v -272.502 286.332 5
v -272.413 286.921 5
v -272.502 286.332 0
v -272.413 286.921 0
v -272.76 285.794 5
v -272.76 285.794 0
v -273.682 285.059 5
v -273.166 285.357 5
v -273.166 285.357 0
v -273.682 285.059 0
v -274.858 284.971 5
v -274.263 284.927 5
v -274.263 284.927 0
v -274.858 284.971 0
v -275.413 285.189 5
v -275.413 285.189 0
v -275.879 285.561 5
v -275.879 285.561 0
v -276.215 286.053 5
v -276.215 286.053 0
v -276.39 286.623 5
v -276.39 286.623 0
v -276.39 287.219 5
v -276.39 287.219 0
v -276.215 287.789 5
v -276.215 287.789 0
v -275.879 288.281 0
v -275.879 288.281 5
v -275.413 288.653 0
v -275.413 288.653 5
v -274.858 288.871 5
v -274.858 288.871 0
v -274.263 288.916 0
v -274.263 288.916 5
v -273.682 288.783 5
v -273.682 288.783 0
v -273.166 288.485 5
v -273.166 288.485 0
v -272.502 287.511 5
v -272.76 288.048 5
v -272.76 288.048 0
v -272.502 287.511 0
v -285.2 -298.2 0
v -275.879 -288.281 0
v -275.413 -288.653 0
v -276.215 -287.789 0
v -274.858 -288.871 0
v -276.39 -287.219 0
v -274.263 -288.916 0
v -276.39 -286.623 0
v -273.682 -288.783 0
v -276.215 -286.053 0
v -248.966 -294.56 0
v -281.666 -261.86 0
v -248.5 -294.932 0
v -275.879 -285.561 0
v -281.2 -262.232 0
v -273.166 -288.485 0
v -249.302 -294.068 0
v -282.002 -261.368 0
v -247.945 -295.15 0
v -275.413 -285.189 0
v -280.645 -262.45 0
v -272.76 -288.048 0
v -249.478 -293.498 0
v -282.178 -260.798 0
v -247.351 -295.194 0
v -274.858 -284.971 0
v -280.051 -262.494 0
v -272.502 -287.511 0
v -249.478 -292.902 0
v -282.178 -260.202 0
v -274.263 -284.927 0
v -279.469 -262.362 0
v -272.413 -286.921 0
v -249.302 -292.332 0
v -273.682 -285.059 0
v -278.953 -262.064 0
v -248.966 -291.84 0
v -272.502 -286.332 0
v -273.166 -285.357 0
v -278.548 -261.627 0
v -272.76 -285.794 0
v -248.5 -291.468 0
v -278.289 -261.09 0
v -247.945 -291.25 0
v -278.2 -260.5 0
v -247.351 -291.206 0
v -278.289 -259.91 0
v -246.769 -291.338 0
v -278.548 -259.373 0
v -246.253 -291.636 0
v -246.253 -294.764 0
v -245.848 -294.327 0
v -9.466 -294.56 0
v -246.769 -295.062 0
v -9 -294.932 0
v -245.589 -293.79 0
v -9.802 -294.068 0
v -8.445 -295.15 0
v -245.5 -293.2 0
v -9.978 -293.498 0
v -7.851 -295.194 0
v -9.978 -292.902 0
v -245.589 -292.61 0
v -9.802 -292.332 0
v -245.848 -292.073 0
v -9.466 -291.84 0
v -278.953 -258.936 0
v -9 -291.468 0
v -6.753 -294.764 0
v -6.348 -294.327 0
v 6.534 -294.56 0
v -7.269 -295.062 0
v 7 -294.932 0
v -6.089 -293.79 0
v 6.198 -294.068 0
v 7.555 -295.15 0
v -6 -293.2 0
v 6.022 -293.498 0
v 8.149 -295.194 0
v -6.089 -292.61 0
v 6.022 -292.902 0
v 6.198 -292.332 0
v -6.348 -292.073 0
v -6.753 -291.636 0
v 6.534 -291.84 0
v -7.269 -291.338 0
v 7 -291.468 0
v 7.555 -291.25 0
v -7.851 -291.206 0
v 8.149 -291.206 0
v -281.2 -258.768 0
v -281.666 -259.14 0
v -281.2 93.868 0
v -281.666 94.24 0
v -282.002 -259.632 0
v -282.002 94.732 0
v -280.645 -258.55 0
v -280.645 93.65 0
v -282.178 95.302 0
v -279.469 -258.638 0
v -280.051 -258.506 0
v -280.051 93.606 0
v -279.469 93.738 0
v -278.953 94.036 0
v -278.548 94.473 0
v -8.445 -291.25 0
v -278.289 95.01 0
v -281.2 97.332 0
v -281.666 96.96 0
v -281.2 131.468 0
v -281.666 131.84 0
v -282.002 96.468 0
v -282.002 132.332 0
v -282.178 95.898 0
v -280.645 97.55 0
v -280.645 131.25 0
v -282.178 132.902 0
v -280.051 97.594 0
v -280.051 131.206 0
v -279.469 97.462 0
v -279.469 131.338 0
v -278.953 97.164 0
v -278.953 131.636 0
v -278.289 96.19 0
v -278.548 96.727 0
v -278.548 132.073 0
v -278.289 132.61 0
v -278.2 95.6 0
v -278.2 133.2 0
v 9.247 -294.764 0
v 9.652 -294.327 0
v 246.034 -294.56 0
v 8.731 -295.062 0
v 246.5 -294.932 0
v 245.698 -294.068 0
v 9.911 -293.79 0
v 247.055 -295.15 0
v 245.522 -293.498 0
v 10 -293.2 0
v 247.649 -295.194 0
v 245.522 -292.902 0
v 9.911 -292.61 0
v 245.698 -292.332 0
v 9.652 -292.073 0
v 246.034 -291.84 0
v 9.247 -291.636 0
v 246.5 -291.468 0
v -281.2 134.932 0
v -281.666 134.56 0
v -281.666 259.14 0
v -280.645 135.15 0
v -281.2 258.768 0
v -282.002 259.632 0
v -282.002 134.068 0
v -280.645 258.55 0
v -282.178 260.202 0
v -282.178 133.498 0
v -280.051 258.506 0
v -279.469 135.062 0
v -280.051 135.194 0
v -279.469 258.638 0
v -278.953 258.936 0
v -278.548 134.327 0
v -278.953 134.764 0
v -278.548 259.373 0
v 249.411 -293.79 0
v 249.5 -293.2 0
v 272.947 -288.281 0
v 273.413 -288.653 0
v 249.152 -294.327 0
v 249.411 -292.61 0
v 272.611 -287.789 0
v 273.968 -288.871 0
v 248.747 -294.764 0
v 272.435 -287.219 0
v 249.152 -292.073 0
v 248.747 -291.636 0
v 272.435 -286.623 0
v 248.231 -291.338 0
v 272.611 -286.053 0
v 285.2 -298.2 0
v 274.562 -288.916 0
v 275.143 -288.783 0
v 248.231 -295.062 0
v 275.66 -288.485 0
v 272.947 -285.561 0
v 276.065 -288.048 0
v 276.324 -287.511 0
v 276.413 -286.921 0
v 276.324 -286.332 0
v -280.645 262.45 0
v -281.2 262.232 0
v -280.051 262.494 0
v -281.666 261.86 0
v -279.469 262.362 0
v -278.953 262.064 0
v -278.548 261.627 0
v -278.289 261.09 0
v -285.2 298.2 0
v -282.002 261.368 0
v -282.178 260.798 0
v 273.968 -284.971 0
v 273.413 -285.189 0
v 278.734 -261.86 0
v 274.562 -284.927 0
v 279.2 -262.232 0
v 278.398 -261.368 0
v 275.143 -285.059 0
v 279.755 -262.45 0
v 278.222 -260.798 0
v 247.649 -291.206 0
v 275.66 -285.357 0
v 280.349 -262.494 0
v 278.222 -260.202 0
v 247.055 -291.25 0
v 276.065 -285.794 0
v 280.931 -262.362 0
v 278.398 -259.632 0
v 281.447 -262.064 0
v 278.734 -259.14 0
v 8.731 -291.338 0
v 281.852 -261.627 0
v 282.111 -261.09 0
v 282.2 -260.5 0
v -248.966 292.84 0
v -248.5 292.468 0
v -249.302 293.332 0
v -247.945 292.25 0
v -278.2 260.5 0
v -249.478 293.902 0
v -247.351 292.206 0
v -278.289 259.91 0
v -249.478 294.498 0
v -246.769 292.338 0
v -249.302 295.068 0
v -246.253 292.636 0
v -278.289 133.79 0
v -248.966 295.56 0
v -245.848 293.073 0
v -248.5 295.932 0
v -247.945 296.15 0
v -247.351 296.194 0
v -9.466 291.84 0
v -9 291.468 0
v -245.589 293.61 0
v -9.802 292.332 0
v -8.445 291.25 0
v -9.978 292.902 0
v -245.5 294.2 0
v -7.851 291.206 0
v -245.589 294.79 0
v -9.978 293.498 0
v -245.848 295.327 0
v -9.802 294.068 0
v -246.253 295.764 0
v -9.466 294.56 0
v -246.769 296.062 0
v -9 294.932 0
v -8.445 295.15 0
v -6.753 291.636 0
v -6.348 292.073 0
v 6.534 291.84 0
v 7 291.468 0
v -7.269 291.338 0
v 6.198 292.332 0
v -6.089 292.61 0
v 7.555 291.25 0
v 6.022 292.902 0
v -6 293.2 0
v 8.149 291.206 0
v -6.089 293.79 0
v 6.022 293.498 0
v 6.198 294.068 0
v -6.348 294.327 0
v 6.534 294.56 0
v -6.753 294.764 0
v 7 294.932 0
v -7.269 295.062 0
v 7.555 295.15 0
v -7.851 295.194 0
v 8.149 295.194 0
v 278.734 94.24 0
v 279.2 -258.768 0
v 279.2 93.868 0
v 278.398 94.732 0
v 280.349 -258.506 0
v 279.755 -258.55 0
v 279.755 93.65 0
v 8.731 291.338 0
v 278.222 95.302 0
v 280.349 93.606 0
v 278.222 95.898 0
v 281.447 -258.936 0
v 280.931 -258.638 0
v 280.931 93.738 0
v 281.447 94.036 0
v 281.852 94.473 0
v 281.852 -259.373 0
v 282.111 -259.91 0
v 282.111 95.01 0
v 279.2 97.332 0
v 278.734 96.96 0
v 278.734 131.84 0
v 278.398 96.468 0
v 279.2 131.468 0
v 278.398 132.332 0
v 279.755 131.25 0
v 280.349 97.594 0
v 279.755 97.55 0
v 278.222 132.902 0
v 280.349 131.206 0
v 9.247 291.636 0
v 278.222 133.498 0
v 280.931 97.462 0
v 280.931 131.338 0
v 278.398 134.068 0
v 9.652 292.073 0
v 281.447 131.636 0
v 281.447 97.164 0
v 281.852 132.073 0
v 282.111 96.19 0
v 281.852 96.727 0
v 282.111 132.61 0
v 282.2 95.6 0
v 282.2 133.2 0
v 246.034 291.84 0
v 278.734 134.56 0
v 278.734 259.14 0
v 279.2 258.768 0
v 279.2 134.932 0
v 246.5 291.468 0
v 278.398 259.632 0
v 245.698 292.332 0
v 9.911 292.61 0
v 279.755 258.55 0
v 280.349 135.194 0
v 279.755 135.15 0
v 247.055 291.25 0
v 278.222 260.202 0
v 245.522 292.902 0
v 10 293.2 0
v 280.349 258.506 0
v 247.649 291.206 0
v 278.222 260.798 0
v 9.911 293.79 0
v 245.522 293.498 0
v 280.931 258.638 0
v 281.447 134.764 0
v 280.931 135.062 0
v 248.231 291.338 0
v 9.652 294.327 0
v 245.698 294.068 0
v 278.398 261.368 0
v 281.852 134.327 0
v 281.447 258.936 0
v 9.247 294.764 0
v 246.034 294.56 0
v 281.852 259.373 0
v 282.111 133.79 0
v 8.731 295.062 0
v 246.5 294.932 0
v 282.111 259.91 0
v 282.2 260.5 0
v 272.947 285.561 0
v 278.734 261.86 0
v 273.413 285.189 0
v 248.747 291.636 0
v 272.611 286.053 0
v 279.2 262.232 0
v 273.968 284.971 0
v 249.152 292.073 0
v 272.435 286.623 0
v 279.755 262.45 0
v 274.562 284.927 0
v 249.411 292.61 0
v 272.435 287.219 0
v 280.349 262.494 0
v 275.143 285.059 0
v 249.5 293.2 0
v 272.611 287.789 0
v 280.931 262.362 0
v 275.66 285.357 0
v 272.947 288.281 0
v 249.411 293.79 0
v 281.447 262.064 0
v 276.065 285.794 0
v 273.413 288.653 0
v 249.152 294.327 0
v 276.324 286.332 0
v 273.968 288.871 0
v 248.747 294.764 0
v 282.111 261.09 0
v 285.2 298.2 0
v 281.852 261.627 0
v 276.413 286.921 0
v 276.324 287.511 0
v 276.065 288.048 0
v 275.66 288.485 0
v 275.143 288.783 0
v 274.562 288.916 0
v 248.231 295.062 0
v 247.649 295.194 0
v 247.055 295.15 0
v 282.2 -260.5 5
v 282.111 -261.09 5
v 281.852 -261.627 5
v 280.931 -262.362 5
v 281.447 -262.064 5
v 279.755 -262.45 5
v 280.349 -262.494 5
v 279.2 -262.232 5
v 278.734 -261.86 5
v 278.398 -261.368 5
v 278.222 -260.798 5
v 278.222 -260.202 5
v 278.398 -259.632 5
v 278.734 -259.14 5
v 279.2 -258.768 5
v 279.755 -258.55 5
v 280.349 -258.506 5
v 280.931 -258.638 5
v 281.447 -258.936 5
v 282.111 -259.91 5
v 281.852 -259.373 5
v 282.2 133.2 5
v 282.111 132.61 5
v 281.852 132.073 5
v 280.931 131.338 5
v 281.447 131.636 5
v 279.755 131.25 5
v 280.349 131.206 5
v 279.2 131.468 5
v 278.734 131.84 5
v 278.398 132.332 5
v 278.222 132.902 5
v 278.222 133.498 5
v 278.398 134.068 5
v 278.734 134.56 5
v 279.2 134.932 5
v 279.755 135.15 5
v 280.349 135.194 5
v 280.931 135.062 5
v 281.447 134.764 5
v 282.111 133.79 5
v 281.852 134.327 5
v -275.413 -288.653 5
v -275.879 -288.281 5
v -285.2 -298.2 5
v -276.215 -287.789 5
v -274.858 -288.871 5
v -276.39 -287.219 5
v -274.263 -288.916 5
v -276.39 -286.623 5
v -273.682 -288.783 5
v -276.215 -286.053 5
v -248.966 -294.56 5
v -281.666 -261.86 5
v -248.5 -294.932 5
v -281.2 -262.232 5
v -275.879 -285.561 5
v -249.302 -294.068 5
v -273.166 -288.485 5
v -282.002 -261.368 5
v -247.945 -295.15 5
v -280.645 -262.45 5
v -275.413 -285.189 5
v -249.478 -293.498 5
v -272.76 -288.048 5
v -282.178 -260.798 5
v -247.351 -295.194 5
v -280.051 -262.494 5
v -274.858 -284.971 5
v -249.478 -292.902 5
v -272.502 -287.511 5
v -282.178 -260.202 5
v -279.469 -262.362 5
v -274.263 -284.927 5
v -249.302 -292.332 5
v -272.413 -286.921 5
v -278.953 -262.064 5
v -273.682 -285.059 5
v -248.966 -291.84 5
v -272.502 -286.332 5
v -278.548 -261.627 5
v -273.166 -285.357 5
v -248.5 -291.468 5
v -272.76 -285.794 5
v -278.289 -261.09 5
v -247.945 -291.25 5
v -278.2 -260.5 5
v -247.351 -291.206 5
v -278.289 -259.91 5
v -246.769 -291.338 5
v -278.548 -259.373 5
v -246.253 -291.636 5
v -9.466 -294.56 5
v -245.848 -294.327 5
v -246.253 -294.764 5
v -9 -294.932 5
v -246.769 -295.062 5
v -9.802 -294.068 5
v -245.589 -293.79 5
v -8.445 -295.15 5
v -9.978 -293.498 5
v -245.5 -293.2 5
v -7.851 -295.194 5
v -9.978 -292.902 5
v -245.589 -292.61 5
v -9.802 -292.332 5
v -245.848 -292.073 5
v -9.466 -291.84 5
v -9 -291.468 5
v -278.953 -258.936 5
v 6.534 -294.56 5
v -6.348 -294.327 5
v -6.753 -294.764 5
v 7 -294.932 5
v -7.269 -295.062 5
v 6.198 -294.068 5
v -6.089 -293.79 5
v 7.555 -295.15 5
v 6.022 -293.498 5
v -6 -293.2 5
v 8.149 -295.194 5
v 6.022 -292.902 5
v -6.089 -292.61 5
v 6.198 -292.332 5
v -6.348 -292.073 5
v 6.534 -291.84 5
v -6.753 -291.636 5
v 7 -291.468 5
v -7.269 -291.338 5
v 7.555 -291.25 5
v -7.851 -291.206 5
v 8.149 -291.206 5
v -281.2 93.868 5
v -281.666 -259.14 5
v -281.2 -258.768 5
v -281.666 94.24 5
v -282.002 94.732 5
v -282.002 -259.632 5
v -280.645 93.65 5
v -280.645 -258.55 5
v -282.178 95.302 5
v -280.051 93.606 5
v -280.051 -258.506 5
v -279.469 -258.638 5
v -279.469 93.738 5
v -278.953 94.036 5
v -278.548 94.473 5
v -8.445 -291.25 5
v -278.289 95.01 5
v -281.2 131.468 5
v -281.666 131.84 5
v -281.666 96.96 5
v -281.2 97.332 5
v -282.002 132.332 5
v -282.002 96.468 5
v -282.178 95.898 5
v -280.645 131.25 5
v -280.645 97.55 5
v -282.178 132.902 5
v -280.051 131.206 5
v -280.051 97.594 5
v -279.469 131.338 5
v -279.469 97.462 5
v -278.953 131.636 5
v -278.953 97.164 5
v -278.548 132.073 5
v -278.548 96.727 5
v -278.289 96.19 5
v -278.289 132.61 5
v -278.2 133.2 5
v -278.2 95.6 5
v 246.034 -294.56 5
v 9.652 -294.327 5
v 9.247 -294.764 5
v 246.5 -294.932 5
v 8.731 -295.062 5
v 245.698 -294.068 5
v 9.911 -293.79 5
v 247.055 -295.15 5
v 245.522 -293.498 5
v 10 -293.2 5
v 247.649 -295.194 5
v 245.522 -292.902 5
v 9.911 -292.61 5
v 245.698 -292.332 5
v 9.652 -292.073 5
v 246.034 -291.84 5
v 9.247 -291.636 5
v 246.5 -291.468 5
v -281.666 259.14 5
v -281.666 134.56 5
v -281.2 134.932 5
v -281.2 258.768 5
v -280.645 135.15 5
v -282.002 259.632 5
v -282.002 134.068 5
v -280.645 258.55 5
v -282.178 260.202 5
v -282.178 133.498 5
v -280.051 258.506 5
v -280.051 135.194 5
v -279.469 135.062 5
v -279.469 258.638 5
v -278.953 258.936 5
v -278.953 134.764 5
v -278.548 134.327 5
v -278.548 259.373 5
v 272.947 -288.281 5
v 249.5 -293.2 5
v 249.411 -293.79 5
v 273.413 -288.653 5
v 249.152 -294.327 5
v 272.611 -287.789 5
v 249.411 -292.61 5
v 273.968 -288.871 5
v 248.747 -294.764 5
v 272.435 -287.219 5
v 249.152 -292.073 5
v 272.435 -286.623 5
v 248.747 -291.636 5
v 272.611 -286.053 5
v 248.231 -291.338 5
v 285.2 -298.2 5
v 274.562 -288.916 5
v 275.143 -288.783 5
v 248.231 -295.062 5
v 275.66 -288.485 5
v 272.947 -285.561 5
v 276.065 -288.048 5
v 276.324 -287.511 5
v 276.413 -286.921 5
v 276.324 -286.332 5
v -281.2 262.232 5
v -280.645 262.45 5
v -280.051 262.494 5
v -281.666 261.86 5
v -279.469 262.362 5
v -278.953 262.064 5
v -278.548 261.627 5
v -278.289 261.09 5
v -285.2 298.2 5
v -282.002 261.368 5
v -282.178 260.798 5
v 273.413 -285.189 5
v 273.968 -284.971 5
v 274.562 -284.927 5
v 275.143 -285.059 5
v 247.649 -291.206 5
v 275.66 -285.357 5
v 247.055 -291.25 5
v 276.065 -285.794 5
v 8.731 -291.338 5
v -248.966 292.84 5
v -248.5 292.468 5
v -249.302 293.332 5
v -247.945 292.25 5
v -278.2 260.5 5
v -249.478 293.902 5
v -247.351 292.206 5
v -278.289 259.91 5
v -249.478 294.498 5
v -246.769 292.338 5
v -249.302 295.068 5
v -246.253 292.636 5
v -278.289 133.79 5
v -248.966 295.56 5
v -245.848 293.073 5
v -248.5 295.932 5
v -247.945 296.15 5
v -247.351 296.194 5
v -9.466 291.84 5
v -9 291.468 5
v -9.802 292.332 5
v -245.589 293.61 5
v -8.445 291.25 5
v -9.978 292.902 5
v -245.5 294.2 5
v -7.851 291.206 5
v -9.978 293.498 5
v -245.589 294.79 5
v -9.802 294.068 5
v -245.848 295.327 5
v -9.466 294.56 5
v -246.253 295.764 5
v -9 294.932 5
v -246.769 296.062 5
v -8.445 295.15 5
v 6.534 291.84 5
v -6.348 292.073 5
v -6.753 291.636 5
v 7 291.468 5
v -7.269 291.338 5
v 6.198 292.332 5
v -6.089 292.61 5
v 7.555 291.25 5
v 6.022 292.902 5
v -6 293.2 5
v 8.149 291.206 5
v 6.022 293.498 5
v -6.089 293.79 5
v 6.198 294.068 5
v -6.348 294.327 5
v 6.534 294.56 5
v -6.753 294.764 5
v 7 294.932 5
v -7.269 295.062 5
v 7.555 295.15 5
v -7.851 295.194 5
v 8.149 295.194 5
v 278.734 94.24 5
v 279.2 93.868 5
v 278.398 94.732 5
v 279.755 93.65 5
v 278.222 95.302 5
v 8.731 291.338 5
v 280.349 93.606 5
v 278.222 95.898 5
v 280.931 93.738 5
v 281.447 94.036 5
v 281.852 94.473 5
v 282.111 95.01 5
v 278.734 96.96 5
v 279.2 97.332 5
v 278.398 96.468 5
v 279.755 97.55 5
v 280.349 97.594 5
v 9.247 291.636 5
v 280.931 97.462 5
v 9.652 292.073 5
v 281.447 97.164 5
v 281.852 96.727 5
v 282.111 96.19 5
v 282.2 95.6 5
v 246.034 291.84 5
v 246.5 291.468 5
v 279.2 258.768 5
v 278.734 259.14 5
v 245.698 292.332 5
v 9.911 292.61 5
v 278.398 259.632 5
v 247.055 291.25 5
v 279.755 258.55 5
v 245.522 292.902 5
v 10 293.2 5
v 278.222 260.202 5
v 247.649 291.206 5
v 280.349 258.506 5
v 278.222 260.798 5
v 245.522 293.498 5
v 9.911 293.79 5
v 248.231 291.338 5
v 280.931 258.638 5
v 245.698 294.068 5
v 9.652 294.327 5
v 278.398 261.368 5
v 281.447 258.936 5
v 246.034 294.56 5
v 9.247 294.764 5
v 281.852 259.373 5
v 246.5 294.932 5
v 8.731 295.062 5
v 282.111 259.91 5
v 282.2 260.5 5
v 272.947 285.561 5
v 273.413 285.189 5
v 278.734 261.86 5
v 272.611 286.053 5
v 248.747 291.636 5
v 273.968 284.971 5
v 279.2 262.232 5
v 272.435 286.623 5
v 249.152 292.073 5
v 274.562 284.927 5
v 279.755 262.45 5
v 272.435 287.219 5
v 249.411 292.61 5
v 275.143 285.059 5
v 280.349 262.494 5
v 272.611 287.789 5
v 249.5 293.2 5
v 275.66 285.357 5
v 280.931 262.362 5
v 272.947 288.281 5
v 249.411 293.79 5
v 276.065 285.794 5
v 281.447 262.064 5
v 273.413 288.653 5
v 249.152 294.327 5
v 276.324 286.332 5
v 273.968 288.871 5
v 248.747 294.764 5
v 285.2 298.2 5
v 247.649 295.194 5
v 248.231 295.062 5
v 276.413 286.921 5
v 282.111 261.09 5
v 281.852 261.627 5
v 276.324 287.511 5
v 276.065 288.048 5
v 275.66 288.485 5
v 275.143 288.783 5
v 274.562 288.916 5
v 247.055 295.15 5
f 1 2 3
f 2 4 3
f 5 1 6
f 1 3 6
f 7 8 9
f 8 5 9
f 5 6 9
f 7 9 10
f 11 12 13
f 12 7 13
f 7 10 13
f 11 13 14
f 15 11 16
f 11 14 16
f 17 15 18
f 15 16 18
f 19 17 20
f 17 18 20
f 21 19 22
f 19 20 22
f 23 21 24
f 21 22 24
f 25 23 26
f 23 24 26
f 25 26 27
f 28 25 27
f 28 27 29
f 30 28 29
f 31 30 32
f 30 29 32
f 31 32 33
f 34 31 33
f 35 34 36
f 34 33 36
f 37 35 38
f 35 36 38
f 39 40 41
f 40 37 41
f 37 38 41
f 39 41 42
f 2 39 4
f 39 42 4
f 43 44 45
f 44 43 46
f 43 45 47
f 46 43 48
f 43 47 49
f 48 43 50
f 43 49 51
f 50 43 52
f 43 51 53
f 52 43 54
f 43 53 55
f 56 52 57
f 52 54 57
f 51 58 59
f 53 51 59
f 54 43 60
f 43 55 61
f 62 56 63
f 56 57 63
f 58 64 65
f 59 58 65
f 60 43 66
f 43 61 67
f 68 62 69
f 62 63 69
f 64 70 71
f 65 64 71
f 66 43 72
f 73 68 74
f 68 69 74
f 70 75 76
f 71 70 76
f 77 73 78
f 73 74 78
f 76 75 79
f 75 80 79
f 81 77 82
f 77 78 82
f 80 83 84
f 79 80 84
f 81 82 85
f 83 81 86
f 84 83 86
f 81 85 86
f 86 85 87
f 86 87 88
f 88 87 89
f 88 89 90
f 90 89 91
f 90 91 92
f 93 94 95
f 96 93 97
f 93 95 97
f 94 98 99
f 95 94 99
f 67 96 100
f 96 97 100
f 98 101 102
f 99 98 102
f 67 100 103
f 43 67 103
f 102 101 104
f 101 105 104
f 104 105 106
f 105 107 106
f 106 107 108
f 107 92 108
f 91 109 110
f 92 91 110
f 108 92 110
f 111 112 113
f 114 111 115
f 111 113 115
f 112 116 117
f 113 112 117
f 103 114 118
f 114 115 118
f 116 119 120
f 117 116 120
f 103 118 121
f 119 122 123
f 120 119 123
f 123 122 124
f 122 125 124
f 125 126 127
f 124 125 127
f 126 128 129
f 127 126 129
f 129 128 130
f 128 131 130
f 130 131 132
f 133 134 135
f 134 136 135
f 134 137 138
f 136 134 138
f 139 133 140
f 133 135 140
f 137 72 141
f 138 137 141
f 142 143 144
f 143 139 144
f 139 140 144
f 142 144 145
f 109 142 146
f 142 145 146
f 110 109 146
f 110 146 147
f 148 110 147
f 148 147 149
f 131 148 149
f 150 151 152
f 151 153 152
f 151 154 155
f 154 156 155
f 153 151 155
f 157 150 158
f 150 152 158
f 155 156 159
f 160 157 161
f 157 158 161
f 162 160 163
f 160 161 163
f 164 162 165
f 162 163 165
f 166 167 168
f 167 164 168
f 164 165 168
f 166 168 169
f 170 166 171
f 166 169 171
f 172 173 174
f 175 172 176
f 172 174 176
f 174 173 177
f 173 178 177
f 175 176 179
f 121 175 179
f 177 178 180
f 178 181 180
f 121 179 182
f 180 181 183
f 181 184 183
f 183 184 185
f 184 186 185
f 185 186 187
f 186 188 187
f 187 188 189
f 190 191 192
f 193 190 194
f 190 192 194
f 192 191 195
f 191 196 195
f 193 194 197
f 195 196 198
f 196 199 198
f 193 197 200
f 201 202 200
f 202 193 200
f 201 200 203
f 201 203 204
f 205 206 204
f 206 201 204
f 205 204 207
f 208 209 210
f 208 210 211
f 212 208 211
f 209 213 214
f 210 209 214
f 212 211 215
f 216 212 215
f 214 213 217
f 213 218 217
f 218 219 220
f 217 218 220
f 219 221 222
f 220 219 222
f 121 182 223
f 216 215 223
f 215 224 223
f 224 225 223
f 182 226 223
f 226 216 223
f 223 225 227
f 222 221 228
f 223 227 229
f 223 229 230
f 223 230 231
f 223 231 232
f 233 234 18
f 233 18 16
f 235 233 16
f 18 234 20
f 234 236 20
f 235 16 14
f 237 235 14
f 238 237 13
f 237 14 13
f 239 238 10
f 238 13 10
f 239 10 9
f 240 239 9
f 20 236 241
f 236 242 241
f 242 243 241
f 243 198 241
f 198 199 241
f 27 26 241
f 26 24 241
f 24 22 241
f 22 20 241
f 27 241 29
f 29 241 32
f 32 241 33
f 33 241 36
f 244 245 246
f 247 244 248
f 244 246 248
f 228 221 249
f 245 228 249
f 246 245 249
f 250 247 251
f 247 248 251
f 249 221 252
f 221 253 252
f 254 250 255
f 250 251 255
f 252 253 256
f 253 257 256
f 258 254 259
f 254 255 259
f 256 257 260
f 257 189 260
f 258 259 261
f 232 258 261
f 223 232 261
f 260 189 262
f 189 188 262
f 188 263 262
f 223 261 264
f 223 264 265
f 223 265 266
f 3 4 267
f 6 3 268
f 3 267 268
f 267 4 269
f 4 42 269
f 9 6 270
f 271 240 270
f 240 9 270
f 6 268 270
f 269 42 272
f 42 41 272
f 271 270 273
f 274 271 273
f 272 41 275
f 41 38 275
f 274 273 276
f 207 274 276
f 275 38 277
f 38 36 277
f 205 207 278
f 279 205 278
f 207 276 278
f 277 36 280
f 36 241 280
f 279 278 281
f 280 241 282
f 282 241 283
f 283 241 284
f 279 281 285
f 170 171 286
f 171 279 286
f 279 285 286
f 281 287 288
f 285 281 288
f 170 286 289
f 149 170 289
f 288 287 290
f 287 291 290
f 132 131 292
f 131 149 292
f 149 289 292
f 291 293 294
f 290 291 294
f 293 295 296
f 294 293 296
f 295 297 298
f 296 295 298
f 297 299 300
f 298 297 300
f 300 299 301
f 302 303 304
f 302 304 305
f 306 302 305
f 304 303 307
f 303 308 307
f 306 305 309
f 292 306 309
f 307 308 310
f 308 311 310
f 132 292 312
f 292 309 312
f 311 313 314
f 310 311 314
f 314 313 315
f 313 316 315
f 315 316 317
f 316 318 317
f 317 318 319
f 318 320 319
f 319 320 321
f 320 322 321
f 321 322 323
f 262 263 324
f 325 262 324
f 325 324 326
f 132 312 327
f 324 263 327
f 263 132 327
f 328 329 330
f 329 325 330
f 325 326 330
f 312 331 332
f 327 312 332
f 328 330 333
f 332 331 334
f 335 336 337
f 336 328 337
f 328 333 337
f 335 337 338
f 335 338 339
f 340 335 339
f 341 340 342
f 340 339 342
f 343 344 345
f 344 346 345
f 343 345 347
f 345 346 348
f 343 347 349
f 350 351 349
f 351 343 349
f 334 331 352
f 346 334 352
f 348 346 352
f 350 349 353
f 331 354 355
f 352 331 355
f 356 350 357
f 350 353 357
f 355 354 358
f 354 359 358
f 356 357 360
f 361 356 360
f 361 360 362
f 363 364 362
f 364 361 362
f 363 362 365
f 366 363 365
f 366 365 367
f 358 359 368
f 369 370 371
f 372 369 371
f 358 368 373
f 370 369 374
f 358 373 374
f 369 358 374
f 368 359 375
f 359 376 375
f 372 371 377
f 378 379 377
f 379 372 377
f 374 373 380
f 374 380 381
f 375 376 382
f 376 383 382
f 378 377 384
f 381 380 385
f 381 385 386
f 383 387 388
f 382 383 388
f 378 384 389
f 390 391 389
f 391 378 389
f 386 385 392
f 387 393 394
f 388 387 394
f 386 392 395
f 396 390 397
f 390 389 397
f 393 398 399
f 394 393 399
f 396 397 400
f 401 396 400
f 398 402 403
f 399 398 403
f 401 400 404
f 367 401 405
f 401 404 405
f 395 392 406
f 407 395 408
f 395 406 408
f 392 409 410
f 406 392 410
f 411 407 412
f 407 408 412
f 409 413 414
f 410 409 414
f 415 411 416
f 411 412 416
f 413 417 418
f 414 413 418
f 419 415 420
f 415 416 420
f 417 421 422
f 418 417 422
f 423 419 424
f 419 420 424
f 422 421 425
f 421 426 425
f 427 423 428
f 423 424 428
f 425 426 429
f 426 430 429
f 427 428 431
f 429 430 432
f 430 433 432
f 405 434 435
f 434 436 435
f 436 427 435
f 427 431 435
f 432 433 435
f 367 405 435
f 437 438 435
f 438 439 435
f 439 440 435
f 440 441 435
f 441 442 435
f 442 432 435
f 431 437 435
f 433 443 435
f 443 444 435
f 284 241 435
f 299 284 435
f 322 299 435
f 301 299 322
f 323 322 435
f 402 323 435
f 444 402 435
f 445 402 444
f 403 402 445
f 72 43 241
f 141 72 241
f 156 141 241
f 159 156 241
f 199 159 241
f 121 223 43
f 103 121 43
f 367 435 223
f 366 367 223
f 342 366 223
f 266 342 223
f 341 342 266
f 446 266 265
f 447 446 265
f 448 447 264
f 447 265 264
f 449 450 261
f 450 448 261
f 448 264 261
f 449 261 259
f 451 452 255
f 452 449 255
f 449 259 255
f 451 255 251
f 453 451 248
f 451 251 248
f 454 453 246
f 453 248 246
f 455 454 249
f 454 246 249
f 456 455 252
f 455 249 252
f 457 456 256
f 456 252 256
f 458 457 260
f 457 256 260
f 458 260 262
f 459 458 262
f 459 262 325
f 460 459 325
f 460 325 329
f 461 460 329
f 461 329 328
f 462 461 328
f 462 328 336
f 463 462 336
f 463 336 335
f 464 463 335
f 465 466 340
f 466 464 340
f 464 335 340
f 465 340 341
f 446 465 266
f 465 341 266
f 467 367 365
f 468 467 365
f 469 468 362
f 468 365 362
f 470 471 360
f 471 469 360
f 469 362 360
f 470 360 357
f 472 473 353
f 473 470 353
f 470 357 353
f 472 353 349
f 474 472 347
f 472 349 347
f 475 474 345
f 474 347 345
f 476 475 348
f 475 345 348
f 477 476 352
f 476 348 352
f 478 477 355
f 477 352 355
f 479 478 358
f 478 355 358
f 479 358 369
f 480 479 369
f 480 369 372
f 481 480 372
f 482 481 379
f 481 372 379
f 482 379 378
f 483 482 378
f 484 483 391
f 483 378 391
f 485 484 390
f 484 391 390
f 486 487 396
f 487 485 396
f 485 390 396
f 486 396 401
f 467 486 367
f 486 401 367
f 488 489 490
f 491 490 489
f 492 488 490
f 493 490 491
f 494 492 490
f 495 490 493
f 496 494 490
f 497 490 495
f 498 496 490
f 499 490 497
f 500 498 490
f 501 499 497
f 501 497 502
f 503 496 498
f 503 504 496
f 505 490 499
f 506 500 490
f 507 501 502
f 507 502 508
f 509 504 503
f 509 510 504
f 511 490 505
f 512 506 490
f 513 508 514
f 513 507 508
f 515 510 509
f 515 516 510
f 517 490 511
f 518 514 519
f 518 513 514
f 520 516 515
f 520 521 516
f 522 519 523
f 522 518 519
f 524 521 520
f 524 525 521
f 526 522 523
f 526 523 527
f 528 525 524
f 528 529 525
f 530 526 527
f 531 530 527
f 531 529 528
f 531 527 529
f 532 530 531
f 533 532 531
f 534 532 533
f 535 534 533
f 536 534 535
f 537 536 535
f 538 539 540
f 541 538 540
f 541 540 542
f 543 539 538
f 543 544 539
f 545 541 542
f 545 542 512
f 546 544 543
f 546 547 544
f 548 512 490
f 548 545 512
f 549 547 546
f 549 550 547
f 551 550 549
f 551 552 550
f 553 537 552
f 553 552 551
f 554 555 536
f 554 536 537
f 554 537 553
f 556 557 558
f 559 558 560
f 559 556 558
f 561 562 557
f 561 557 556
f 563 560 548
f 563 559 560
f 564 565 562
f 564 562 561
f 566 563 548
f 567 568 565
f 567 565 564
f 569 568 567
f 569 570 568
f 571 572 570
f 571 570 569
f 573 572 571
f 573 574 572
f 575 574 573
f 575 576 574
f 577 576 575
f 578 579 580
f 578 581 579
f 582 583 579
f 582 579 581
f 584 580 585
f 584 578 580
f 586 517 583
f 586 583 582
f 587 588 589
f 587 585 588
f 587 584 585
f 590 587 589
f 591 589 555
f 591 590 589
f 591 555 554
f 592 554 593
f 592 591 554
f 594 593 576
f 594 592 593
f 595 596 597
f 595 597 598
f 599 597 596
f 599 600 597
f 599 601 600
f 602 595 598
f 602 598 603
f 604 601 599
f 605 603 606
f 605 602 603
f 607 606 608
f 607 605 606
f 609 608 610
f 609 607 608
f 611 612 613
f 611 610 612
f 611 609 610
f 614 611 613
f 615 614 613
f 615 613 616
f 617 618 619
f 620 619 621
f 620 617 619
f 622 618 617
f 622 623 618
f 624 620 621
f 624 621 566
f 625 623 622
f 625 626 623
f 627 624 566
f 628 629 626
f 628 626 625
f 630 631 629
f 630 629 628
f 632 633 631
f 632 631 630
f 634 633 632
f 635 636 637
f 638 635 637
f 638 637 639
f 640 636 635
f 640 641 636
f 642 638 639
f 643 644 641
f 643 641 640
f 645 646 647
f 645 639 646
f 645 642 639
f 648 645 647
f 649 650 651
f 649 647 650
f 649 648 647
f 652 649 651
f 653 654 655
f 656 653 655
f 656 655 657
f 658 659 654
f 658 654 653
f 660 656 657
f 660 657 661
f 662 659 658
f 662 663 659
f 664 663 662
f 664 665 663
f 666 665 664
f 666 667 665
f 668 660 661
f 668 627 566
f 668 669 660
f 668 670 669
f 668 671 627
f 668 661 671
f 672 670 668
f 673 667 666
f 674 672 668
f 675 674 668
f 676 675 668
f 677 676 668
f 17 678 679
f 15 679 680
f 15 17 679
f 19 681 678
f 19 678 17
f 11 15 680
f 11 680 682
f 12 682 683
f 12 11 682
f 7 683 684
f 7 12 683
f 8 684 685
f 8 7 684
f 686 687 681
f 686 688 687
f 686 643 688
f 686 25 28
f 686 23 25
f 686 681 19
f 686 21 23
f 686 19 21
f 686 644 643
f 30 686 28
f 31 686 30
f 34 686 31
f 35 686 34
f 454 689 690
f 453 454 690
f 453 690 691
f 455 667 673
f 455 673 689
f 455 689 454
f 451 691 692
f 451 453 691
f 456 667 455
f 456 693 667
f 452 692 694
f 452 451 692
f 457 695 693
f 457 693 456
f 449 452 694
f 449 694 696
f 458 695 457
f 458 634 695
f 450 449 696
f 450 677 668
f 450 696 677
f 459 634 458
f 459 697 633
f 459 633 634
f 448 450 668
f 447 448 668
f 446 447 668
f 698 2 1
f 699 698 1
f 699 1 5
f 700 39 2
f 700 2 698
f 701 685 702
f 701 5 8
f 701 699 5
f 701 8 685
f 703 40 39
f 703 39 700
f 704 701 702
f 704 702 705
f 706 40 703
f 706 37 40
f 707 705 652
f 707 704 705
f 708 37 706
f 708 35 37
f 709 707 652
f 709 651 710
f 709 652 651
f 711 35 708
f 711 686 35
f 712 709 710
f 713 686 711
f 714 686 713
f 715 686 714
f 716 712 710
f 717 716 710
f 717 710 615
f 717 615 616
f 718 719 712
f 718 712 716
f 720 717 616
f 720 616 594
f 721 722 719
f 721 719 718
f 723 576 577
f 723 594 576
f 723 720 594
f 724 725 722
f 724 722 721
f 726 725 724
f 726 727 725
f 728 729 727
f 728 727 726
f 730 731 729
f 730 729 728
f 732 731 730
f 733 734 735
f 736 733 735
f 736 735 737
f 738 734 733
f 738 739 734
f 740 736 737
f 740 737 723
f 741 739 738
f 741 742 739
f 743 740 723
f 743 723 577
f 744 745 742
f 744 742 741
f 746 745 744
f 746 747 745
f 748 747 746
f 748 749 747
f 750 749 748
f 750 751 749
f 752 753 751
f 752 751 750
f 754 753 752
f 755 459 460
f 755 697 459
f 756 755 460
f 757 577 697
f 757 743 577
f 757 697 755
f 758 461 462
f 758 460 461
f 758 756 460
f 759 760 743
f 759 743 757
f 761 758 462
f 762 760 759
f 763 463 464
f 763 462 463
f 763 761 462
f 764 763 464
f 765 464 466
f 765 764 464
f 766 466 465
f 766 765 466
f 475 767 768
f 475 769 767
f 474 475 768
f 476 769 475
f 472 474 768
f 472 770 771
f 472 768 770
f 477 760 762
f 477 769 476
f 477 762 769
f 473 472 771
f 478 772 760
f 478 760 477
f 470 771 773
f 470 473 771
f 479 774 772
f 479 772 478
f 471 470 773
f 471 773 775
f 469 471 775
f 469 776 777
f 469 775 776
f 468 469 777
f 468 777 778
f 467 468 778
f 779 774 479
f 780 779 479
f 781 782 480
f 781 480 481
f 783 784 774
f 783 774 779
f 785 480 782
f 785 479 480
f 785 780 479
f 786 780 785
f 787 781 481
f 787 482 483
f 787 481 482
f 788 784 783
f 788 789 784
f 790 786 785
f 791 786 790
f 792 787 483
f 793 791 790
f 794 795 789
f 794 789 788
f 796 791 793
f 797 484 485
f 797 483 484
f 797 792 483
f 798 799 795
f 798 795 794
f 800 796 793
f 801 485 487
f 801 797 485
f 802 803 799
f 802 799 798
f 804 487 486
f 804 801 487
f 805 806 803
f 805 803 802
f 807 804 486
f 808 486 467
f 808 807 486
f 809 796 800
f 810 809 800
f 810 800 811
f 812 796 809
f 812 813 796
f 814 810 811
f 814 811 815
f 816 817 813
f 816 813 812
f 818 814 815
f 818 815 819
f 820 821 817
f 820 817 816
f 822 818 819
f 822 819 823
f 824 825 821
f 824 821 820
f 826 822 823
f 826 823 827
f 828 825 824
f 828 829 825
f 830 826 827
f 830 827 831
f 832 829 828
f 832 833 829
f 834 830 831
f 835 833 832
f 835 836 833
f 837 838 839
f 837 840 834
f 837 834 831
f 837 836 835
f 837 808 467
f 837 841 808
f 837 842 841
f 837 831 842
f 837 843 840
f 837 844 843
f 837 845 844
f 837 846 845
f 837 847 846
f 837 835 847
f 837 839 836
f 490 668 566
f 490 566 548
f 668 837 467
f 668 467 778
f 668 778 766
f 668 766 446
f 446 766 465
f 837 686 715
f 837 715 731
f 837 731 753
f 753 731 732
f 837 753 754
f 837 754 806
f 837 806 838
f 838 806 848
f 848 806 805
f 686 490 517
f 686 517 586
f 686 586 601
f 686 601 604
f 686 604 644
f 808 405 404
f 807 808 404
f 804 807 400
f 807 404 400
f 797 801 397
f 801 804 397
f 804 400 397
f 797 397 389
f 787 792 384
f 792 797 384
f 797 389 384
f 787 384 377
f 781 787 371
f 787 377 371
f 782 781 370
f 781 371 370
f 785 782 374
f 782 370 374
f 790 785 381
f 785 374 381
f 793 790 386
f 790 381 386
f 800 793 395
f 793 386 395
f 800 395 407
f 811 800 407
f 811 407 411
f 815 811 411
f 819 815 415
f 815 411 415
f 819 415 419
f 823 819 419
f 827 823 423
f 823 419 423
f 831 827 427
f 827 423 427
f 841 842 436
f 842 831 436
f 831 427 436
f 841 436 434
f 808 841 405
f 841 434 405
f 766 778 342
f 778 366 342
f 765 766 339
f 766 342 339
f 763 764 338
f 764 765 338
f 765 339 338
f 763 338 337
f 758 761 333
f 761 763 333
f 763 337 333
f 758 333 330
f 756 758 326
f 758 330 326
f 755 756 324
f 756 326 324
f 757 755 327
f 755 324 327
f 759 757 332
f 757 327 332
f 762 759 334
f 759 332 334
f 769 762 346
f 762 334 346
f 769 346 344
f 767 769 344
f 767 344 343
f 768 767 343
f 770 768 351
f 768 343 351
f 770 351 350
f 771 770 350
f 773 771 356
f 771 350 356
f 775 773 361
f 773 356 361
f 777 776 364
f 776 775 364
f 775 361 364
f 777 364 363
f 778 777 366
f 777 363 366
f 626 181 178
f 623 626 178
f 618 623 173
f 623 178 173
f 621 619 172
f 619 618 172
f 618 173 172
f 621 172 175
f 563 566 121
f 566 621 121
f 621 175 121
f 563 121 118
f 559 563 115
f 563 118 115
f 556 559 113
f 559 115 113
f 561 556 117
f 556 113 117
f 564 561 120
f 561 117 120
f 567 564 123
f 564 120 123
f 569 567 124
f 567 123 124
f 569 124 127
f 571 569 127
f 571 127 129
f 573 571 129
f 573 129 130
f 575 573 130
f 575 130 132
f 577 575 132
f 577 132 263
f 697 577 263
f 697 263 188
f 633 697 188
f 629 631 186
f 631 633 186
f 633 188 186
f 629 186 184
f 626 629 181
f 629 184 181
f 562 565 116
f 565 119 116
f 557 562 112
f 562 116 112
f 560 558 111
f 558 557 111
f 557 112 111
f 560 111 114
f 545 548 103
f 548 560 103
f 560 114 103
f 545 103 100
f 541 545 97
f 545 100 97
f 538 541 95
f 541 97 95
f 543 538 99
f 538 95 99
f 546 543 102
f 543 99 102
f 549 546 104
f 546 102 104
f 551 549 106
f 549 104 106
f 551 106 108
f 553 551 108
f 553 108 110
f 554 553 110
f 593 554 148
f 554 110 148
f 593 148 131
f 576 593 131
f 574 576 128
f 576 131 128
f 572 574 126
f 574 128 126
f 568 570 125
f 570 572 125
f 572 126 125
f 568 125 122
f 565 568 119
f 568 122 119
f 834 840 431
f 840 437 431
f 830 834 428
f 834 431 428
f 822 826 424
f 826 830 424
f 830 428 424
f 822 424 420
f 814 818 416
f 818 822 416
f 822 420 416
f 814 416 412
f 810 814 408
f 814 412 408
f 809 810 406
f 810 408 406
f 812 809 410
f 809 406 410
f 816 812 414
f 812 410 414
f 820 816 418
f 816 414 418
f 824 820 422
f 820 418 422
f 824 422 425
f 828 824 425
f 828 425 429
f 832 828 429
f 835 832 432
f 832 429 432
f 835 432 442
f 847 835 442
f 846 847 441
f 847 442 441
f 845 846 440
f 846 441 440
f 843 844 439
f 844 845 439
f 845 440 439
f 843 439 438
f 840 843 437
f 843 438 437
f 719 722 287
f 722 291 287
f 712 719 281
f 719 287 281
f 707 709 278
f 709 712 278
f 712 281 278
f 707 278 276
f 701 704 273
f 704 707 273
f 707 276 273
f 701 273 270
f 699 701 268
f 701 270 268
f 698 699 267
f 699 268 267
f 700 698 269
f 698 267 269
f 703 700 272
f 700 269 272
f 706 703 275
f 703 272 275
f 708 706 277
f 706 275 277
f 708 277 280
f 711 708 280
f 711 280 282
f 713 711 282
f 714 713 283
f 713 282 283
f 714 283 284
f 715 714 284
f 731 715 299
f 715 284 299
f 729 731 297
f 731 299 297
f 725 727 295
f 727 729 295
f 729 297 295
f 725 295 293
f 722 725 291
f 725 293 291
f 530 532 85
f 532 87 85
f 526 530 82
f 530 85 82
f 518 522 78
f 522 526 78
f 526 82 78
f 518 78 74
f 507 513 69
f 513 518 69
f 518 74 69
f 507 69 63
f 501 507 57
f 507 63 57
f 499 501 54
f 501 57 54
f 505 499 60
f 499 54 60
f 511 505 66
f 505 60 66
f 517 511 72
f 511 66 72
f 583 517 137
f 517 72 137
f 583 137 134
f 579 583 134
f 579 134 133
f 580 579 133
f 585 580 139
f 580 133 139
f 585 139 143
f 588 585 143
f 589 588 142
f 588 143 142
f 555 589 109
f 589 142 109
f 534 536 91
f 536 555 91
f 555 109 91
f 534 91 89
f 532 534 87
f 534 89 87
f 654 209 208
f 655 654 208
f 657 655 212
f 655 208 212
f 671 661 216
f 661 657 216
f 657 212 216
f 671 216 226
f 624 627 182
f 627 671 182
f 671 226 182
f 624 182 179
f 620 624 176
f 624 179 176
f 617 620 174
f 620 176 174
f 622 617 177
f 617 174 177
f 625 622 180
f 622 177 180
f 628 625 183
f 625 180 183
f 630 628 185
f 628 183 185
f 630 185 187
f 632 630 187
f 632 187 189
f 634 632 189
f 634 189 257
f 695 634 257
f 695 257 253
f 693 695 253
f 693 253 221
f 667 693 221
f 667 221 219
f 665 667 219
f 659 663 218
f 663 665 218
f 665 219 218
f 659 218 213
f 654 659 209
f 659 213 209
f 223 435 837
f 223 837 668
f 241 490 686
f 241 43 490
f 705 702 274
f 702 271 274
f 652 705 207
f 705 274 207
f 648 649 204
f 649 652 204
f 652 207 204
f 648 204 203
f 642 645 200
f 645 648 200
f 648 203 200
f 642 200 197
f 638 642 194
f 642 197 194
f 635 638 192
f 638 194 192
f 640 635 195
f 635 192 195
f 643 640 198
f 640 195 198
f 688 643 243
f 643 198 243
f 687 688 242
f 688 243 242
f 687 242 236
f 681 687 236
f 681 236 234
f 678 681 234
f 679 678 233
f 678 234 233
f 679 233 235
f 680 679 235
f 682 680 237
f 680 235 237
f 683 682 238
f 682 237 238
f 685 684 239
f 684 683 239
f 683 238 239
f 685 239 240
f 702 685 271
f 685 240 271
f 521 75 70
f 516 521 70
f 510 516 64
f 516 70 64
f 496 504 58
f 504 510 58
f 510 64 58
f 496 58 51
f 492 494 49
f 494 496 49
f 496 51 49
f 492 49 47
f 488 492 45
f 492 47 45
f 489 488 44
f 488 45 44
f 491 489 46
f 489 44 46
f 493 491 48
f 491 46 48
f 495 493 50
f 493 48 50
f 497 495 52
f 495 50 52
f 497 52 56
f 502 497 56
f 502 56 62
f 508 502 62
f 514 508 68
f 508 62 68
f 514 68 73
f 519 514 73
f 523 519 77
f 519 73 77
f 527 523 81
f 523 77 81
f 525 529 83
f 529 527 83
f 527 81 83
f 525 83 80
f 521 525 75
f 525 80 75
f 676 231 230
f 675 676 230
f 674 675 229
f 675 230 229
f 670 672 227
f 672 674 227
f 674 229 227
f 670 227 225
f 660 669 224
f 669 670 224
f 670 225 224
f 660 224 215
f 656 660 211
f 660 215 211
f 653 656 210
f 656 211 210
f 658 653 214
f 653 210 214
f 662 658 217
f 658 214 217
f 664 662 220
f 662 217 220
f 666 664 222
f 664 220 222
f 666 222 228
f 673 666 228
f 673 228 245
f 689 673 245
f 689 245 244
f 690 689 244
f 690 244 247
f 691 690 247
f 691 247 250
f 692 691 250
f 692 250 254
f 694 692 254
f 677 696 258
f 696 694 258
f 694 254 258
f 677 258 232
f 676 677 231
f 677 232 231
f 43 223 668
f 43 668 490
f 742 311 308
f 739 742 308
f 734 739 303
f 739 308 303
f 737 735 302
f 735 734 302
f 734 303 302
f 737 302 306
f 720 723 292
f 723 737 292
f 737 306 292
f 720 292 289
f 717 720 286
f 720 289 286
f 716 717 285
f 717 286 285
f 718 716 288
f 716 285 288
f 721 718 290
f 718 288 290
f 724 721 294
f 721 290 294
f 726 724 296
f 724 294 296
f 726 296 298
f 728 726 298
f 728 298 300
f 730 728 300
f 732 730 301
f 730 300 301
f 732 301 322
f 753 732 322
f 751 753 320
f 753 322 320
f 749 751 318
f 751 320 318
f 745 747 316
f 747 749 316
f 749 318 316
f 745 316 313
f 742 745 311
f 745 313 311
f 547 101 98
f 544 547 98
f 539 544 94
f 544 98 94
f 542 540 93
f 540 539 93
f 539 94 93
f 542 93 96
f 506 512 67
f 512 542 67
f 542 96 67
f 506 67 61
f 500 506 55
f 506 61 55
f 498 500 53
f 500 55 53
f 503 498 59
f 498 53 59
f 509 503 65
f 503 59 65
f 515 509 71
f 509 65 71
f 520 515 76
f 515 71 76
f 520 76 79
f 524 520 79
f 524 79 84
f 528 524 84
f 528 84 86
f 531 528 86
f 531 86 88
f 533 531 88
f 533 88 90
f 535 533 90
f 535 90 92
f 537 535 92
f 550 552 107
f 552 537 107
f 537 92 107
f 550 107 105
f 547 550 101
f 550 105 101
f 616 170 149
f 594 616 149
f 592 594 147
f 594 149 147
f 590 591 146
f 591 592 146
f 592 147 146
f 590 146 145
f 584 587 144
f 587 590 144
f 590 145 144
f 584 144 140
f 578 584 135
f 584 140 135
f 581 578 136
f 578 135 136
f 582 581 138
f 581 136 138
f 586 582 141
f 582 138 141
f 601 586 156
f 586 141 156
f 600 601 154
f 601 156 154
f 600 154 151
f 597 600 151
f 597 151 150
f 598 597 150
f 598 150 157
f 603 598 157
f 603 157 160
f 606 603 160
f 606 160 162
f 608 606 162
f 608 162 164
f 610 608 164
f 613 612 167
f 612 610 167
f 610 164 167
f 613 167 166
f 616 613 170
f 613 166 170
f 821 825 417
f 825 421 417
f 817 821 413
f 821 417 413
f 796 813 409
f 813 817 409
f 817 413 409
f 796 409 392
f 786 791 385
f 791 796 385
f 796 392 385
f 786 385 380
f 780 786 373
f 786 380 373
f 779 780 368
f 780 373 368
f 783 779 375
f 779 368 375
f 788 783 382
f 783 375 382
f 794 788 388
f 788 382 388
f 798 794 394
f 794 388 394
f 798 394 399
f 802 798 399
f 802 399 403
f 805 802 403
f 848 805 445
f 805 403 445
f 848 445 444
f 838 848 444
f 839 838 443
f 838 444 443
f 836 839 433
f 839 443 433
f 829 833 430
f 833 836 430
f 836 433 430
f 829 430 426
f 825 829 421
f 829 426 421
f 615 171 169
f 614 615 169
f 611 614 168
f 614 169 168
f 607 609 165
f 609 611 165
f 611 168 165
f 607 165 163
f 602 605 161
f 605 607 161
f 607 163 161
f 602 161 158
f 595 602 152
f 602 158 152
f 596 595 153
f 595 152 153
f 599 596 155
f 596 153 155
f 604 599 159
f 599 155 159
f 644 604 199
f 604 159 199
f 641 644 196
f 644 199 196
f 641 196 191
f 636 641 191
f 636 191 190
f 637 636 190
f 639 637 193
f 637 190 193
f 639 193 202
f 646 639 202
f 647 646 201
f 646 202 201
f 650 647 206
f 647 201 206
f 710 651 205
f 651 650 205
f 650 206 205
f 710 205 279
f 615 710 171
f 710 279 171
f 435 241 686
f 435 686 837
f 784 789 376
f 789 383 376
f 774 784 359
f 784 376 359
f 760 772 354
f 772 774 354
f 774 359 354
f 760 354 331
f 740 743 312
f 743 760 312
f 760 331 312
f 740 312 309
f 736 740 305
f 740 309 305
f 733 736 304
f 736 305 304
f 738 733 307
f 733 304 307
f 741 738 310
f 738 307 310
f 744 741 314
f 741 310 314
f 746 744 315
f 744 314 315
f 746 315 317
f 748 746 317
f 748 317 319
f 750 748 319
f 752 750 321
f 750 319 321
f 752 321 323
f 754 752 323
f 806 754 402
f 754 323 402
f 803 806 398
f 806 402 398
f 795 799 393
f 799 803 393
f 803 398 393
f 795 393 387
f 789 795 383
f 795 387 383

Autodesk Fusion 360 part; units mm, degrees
sketch "Sketch1" plane through (0, 0, 0) normal (0, 0, 1) x (1, 0, 0)
  line L0 (285.2, -298.2) -> (-285.2, -298.2)
  line L1 (-285.2, -298.2) -> (-285.2, 298.2)
  line L2 (-285.2, 298.2) -> (285.2, 298.2)
  line L3 (285.2, 298.2) -> (285.2, -298.2)
  line L4 (285.2, -298.2) -> (-285.2, 298.2) construction
  line L5 (-285.2, -298.2) -> (285.2, 298.2) construction
  circle A0 centre (-247.5, 294.2) radius 2
  circle A1 centre (-280.2, 260.5) radius 2
  circle A2 centre (-247.5, -293.2) radius 2
  circle A3 centre (-280.2, -260.5) radius 2
  circle A4 centre (247.5, 293.2) radius 2
  circle A5 centre (280.2, 260.5) radius 2
  circle A6 centre (247.5, -293.2) radius 2
  circle A7 centre (280.2, -260.5) radius 2
  line L6 (0, -298.2) -> (0, 298.2) construction
  circle A8 centre (8, 293.2) radius 2
  circle A9 centre (8, -293.2) radius 2
  circle A10 centre (-274.4128, -286.9211) radius 2
  circle A11 centre (274.4128, -286.9211) radius 2
  circle A12 centre (274.4128, 286.9211) radius 2
  circle A13 centre (-274.4128, 286.9211) radius 2
  circle A14 centre (-8, -293.2) radius 2
  circle A15 centre (-8, 293.2) radius 2
  line L7 (285.2, 114.4) -> (-285.2, 114.4) construction
  circle A16 centre (280.2, 95.6) radius 2
  circle A17 centre (280.2, 133.2) radius 2
  circle A18 centre (-280.2, 133.2) radius 2
  circle A19 centre (-280.2, 95.6) radius 2
  dimension "d1" = 570.4
  dimension "d2" = 596.4
  dimension "d4" = 4
  dimension "d5" = 4
  dimension "d6" = 4
  dimension "d7" = 37.7
  dimension "d8" = 4
  dimension "d9" = 4
  dimension "d13" = 4
  dimension "d14" = 4
  dimension "d17" = 4
  dimension "d18" = 4
  dimension "d23" = 4
  dimension "d24" = 4
  dimension "d25" = 5
  dimension "d26" = 5
  dimension "d30" = 5
  dimension "d31" = 5
  dimension "d32" = 4
  dimension "d33" = 15.607
  dimension "d34" = 5
  dimension "d35" = 5
  dimension "d36" = 37.7
  dimension "d37" = 37.7
  dimension "d38" = 37.7
  dimension "d39" = 37.7
  dimension "d40" = 4
  dimension "d41" = 15.607
  dimension "d42" = 5
  dimension "d43" = 37.7
  dimension "d44" = 5
  dimension "d45" = 37.7
  dimension "d46" = 4
  dimension "d47" = 15.607
  dimension "d48" = 4
  dimension "d49" = 15.607
  dimension "d50" = 37.7
  dimension "d51" = 5
  dimension "d52" = 4
  dimension "d53" = 8
  dimension "d54" = 8
  dimension "d55" = 5
  dimension "d56" = 8
  dimension "d57" = 4
  dimension "d58" = 8
  dimension "d59" = 5
  dimension "d60" = 412.6
  dimension "d61" = 4
  dimension "d62" = 4
  dimension "d63" = 18.8
  dimension "d64" = 18.8
  dimension "d65" = 5
  dimension "d66" = 5
  dimension "d67" = 4
  dimension "d68" = 4
  dimension "d69" = 18.8
  dimension "d70" = 18.8
  dimension "d71" = 5
  dimension "d72" = 5
extrude "Extrude1" add sketch "Sketch1" along normal blind 5 makes body 1
copy_body "Body->Comp1" bodies 1 removing the originals makes body 2 in component "Bottom"
component "Bottom" placed x (1, 0, 0) y (0, 1, 0) z (0, 0, 1) at (0, 0, 0)
equation "d1 = XRailLength + 220.4 mm"
equation "d2 = YRailLength + 246.4 mm"
equation "d60 = YRailLength + 62.6 mm"
equation "d63 = ( 37.6 / 2 ) * 1 mm"
equation "d64 = ( 37.6 / 2 ) * 1 mm"
equation "d69 = ( 37.6 / 2 ) * 1 mm"
equation "d70 = ( 37.6 / 2 ) * 1 mm"
equation "XRailLength = 350 mm"
equation "YRailLength = 350 mm"
